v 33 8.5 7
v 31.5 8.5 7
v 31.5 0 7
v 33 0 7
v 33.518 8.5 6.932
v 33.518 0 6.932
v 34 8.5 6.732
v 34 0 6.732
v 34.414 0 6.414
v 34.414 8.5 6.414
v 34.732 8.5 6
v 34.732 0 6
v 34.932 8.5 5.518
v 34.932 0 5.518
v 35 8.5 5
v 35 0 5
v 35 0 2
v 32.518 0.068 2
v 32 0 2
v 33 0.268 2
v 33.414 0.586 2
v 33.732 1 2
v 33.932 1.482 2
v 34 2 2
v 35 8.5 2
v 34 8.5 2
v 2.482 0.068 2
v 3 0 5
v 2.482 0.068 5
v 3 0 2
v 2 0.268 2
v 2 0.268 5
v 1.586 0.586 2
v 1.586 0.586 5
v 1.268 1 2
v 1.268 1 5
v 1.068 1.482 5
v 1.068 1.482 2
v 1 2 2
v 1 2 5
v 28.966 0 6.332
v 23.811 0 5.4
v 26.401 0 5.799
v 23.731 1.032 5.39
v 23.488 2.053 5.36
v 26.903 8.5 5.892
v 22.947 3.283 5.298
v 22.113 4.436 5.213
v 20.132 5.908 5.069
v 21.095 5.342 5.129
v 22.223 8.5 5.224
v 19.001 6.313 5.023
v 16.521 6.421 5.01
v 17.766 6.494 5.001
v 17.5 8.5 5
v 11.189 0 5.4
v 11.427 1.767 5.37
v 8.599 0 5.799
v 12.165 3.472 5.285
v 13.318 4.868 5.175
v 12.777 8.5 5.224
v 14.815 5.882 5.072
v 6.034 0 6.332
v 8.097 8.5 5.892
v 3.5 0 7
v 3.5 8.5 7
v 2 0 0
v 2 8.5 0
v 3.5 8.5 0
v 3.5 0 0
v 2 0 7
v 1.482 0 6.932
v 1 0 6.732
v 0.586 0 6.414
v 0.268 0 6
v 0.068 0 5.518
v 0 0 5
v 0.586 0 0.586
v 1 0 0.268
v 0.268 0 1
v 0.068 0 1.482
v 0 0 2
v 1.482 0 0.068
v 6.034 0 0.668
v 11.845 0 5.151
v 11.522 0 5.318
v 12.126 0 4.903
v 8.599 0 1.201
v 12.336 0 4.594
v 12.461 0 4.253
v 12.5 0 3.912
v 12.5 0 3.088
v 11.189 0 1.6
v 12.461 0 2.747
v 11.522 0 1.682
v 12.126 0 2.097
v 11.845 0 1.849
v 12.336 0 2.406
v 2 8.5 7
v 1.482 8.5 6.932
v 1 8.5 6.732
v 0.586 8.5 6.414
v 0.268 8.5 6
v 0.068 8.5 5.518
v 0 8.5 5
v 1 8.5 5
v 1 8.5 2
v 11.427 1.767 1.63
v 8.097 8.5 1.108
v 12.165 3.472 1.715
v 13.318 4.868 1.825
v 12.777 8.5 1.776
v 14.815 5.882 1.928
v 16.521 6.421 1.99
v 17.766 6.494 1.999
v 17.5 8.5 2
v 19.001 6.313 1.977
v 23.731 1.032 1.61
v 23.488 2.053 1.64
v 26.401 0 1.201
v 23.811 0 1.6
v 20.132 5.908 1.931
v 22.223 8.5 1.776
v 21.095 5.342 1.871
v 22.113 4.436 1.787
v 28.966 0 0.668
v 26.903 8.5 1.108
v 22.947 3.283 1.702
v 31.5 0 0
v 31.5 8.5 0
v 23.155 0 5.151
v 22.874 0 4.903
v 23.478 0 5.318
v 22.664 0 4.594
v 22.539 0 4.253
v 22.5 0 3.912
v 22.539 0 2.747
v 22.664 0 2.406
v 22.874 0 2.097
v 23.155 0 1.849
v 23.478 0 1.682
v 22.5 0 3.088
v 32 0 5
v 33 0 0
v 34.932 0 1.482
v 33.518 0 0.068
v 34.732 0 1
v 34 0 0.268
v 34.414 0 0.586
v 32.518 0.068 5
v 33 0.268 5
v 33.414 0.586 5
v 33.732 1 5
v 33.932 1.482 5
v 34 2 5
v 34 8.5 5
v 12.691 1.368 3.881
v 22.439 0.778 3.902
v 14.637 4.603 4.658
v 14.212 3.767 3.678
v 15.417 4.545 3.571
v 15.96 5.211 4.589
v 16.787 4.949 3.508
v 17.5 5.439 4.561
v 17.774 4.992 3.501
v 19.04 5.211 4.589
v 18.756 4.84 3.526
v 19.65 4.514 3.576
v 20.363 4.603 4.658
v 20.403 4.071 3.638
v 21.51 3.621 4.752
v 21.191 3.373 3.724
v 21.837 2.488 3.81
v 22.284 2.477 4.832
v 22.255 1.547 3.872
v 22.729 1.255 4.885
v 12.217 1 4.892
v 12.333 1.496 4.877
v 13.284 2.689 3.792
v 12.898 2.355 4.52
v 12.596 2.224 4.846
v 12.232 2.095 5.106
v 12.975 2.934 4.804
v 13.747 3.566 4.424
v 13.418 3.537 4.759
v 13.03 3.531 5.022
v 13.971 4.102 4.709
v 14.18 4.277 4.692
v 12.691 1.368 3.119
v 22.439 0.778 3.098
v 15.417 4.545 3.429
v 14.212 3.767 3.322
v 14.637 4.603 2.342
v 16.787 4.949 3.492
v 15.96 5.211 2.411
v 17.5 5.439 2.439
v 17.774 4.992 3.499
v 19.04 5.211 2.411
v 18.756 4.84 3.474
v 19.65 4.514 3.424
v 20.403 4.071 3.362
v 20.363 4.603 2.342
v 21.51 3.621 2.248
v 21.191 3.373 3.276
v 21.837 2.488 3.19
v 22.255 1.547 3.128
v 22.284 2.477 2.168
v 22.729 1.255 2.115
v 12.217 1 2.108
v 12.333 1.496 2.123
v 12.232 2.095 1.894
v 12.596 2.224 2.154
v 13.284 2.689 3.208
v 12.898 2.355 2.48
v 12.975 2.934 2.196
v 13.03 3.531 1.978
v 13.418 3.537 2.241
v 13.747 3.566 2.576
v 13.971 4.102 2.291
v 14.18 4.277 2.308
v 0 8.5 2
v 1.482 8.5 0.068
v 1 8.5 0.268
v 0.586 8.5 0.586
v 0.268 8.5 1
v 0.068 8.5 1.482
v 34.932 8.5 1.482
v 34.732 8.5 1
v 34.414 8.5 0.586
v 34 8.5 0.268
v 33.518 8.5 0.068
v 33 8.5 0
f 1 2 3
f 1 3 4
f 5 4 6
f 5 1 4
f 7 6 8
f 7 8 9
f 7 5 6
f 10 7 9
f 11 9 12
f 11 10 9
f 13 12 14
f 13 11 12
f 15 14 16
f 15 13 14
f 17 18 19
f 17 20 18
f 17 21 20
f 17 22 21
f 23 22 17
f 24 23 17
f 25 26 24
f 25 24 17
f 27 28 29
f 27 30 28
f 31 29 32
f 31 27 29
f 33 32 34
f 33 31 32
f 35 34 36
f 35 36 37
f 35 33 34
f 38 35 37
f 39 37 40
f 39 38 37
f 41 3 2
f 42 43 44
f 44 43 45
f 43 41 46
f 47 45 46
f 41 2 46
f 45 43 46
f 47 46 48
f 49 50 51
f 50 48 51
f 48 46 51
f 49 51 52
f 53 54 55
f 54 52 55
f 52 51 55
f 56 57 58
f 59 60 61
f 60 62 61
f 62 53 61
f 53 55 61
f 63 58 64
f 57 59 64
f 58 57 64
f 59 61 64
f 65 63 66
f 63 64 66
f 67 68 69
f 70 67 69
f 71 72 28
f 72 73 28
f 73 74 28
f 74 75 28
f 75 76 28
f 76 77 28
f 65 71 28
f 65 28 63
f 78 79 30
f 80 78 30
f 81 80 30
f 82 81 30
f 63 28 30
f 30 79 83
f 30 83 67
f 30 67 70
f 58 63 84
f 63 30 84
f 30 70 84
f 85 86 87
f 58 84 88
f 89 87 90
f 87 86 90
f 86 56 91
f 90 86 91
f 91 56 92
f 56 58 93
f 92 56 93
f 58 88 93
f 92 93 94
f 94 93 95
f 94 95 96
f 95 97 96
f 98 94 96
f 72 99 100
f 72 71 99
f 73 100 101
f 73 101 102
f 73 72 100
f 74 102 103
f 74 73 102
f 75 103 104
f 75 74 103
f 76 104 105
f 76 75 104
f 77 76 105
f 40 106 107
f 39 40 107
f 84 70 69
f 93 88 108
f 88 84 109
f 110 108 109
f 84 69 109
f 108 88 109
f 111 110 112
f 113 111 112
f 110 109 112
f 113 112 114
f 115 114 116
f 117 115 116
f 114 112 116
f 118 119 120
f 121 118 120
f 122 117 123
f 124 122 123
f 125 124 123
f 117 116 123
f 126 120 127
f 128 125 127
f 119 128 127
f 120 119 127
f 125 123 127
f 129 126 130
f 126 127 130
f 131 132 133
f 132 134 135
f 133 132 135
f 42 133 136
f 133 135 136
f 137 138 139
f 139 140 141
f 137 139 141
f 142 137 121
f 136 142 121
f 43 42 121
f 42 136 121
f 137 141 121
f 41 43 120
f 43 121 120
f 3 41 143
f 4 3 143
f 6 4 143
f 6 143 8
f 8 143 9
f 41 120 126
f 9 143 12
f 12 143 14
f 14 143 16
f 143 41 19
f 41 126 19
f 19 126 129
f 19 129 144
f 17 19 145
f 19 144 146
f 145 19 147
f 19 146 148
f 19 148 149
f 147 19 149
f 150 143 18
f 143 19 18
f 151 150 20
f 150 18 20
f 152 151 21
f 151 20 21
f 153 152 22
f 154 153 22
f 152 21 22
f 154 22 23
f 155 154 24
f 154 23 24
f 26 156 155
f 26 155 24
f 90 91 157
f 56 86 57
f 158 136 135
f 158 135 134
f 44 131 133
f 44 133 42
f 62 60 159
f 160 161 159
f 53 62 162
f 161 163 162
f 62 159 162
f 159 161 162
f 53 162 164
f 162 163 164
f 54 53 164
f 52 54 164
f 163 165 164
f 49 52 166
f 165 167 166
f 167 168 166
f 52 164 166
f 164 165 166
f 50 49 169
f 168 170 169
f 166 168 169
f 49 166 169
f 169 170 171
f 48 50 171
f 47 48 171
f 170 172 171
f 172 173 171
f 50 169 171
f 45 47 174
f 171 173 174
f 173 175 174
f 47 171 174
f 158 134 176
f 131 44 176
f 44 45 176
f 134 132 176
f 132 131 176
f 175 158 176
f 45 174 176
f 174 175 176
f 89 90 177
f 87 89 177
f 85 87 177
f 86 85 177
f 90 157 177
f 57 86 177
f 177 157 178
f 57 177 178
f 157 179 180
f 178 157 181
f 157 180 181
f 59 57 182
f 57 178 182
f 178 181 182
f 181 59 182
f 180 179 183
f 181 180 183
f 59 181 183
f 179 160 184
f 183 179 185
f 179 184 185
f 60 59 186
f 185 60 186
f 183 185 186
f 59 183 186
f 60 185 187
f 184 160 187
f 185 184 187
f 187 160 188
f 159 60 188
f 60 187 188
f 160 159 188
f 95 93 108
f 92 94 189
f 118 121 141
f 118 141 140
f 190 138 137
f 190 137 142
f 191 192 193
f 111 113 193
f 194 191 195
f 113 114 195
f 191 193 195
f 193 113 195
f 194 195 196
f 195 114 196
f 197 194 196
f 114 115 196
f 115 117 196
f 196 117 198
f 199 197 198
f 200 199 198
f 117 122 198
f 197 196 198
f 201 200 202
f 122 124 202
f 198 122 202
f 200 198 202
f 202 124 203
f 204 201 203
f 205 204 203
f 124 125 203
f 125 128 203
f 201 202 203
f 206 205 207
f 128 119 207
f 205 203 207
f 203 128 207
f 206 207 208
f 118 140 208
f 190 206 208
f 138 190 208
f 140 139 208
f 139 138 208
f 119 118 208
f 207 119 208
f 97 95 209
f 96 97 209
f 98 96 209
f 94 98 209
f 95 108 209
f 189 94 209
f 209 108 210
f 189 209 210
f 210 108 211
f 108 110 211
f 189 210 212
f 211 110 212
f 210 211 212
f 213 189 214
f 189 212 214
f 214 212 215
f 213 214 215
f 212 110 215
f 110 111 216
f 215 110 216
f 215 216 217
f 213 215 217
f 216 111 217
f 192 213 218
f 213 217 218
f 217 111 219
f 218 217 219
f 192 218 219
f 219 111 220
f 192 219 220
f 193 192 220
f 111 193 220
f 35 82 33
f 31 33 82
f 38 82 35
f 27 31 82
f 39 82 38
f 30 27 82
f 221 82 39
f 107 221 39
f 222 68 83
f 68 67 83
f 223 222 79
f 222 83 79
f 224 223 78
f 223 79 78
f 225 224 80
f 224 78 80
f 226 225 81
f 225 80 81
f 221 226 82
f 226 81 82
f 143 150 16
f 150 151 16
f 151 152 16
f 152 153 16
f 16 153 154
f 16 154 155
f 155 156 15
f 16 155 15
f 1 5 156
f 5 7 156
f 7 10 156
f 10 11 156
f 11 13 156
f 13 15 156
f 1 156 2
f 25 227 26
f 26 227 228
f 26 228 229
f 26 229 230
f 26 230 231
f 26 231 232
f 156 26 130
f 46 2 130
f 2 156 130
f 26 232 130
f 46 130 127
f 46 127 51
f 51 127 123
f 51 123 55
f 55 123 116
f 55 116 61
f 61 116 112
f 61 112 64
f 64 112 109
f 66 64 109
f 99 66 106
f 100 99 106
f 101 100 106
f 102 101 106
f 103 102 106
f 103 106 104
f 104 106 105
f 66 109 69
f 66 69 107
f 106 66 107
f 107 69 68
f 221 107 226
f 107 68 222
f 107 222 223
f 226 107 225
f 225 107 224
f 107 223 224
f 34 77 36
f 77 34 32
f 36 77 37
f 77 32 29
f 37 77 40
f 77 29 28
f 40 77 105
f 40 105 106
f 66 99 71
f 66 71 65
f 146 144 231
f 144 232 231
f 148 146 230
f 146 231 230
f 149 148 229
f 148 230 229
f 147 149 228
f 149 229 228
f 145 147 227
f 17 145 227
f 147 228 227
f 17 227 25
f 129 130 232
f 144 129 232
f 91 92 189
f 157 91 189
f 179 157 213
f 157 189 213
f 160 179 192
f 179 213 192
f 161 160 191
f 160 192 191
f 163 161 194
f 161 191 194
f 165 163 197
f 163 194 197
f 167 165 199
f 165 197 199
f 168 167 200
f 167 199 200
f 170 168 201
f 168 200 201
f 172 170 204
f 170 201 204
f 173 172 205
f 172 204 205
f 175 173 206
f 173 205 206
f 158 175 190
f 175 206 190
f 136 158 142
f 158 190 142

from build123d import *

# Parameters (mm, degrees)
BOSS_EXTRUDE1_DEPTH = 7
SKETCH2_R           = 50
SKETCH2_W           = 6.441902201
SKETCH2_H           = 3
SKETCH2_W_2         = 5.266935295
CUT_EXTRUDE1_DEPTH  = 37.691279618
FILLET1_R           = 2
FILLET2_R           = 1.5


with BuildPart() as part:
    # Sketch1 → Boss-Extrude1 (new body)
    with BuildSketch(Plane.XY):
        with BuildLine():
            Line((0, 0), (12.5, 0))
            ThreePointArc((12.5, 0), (17.5, 5), (22.5, 0))
            Line((22.5, 0), (35, 0))
            Line((35, 0), (35, 8.5))
            Line((35, 8.5), (0, 8.5))
            Line((0, 8.5), (0, 0))
        make_face()
    extrude(amount=BOSS_EXTRUDE1_DEPTH)

    # Sketch2 → Cut-Extrude1 (cut, through all)
    with BuildSketch(Plane(origin=(0, 8.5, 0), x_dir=(1, 0, 0), z_dir=(0, 1, 0))):
        with Locations((17.5, 48)):
            Circle(SKETCH2_R)
        with Locations((17.5, -55)):
            Circle(SKETCH2_R)
        with Locations((37.220951101, -3.5)):
            Rectangle(SKETCH2_W, SKETCH2_H)
        with Locations((-1.633467648, -3.5)):
            Rectangle(SKETCH2_W_2, SKETCH2_H)
    extrude(amount=-CUT_EXTRUDE1_DEPTH, mode=Mode.SUBTRACT)

    # Fillet1
    fillet1_edges = [part.edges().sort_by_distance(p)[0] for p in [
        (35, 4.25, 0),
        (35, 4.25, 7),
        (0, 4.25, 7),
        (0, 4.25, 0),
        (1, 0, 3.5),
        (34, 0, 3.5),
    ]]
    fillet(fillet1_edges, radius=FILLET1_R - 0.0001)  # a hair under: the kernel refuses the full size

    # Fillet2
    fillet2_edges = [part.edges().sort_by_distance(p)[0] for p in [
        (17.48803644, 4.999985682, 1.999998553),
        (17.48803647, 4.999985682, 5.000001447),
    ]]
    fillet(fillet2_edges, radius=FILLET2_R - 0.0001)  # a hair under: the kernel refuses the full size


solid = part.part
